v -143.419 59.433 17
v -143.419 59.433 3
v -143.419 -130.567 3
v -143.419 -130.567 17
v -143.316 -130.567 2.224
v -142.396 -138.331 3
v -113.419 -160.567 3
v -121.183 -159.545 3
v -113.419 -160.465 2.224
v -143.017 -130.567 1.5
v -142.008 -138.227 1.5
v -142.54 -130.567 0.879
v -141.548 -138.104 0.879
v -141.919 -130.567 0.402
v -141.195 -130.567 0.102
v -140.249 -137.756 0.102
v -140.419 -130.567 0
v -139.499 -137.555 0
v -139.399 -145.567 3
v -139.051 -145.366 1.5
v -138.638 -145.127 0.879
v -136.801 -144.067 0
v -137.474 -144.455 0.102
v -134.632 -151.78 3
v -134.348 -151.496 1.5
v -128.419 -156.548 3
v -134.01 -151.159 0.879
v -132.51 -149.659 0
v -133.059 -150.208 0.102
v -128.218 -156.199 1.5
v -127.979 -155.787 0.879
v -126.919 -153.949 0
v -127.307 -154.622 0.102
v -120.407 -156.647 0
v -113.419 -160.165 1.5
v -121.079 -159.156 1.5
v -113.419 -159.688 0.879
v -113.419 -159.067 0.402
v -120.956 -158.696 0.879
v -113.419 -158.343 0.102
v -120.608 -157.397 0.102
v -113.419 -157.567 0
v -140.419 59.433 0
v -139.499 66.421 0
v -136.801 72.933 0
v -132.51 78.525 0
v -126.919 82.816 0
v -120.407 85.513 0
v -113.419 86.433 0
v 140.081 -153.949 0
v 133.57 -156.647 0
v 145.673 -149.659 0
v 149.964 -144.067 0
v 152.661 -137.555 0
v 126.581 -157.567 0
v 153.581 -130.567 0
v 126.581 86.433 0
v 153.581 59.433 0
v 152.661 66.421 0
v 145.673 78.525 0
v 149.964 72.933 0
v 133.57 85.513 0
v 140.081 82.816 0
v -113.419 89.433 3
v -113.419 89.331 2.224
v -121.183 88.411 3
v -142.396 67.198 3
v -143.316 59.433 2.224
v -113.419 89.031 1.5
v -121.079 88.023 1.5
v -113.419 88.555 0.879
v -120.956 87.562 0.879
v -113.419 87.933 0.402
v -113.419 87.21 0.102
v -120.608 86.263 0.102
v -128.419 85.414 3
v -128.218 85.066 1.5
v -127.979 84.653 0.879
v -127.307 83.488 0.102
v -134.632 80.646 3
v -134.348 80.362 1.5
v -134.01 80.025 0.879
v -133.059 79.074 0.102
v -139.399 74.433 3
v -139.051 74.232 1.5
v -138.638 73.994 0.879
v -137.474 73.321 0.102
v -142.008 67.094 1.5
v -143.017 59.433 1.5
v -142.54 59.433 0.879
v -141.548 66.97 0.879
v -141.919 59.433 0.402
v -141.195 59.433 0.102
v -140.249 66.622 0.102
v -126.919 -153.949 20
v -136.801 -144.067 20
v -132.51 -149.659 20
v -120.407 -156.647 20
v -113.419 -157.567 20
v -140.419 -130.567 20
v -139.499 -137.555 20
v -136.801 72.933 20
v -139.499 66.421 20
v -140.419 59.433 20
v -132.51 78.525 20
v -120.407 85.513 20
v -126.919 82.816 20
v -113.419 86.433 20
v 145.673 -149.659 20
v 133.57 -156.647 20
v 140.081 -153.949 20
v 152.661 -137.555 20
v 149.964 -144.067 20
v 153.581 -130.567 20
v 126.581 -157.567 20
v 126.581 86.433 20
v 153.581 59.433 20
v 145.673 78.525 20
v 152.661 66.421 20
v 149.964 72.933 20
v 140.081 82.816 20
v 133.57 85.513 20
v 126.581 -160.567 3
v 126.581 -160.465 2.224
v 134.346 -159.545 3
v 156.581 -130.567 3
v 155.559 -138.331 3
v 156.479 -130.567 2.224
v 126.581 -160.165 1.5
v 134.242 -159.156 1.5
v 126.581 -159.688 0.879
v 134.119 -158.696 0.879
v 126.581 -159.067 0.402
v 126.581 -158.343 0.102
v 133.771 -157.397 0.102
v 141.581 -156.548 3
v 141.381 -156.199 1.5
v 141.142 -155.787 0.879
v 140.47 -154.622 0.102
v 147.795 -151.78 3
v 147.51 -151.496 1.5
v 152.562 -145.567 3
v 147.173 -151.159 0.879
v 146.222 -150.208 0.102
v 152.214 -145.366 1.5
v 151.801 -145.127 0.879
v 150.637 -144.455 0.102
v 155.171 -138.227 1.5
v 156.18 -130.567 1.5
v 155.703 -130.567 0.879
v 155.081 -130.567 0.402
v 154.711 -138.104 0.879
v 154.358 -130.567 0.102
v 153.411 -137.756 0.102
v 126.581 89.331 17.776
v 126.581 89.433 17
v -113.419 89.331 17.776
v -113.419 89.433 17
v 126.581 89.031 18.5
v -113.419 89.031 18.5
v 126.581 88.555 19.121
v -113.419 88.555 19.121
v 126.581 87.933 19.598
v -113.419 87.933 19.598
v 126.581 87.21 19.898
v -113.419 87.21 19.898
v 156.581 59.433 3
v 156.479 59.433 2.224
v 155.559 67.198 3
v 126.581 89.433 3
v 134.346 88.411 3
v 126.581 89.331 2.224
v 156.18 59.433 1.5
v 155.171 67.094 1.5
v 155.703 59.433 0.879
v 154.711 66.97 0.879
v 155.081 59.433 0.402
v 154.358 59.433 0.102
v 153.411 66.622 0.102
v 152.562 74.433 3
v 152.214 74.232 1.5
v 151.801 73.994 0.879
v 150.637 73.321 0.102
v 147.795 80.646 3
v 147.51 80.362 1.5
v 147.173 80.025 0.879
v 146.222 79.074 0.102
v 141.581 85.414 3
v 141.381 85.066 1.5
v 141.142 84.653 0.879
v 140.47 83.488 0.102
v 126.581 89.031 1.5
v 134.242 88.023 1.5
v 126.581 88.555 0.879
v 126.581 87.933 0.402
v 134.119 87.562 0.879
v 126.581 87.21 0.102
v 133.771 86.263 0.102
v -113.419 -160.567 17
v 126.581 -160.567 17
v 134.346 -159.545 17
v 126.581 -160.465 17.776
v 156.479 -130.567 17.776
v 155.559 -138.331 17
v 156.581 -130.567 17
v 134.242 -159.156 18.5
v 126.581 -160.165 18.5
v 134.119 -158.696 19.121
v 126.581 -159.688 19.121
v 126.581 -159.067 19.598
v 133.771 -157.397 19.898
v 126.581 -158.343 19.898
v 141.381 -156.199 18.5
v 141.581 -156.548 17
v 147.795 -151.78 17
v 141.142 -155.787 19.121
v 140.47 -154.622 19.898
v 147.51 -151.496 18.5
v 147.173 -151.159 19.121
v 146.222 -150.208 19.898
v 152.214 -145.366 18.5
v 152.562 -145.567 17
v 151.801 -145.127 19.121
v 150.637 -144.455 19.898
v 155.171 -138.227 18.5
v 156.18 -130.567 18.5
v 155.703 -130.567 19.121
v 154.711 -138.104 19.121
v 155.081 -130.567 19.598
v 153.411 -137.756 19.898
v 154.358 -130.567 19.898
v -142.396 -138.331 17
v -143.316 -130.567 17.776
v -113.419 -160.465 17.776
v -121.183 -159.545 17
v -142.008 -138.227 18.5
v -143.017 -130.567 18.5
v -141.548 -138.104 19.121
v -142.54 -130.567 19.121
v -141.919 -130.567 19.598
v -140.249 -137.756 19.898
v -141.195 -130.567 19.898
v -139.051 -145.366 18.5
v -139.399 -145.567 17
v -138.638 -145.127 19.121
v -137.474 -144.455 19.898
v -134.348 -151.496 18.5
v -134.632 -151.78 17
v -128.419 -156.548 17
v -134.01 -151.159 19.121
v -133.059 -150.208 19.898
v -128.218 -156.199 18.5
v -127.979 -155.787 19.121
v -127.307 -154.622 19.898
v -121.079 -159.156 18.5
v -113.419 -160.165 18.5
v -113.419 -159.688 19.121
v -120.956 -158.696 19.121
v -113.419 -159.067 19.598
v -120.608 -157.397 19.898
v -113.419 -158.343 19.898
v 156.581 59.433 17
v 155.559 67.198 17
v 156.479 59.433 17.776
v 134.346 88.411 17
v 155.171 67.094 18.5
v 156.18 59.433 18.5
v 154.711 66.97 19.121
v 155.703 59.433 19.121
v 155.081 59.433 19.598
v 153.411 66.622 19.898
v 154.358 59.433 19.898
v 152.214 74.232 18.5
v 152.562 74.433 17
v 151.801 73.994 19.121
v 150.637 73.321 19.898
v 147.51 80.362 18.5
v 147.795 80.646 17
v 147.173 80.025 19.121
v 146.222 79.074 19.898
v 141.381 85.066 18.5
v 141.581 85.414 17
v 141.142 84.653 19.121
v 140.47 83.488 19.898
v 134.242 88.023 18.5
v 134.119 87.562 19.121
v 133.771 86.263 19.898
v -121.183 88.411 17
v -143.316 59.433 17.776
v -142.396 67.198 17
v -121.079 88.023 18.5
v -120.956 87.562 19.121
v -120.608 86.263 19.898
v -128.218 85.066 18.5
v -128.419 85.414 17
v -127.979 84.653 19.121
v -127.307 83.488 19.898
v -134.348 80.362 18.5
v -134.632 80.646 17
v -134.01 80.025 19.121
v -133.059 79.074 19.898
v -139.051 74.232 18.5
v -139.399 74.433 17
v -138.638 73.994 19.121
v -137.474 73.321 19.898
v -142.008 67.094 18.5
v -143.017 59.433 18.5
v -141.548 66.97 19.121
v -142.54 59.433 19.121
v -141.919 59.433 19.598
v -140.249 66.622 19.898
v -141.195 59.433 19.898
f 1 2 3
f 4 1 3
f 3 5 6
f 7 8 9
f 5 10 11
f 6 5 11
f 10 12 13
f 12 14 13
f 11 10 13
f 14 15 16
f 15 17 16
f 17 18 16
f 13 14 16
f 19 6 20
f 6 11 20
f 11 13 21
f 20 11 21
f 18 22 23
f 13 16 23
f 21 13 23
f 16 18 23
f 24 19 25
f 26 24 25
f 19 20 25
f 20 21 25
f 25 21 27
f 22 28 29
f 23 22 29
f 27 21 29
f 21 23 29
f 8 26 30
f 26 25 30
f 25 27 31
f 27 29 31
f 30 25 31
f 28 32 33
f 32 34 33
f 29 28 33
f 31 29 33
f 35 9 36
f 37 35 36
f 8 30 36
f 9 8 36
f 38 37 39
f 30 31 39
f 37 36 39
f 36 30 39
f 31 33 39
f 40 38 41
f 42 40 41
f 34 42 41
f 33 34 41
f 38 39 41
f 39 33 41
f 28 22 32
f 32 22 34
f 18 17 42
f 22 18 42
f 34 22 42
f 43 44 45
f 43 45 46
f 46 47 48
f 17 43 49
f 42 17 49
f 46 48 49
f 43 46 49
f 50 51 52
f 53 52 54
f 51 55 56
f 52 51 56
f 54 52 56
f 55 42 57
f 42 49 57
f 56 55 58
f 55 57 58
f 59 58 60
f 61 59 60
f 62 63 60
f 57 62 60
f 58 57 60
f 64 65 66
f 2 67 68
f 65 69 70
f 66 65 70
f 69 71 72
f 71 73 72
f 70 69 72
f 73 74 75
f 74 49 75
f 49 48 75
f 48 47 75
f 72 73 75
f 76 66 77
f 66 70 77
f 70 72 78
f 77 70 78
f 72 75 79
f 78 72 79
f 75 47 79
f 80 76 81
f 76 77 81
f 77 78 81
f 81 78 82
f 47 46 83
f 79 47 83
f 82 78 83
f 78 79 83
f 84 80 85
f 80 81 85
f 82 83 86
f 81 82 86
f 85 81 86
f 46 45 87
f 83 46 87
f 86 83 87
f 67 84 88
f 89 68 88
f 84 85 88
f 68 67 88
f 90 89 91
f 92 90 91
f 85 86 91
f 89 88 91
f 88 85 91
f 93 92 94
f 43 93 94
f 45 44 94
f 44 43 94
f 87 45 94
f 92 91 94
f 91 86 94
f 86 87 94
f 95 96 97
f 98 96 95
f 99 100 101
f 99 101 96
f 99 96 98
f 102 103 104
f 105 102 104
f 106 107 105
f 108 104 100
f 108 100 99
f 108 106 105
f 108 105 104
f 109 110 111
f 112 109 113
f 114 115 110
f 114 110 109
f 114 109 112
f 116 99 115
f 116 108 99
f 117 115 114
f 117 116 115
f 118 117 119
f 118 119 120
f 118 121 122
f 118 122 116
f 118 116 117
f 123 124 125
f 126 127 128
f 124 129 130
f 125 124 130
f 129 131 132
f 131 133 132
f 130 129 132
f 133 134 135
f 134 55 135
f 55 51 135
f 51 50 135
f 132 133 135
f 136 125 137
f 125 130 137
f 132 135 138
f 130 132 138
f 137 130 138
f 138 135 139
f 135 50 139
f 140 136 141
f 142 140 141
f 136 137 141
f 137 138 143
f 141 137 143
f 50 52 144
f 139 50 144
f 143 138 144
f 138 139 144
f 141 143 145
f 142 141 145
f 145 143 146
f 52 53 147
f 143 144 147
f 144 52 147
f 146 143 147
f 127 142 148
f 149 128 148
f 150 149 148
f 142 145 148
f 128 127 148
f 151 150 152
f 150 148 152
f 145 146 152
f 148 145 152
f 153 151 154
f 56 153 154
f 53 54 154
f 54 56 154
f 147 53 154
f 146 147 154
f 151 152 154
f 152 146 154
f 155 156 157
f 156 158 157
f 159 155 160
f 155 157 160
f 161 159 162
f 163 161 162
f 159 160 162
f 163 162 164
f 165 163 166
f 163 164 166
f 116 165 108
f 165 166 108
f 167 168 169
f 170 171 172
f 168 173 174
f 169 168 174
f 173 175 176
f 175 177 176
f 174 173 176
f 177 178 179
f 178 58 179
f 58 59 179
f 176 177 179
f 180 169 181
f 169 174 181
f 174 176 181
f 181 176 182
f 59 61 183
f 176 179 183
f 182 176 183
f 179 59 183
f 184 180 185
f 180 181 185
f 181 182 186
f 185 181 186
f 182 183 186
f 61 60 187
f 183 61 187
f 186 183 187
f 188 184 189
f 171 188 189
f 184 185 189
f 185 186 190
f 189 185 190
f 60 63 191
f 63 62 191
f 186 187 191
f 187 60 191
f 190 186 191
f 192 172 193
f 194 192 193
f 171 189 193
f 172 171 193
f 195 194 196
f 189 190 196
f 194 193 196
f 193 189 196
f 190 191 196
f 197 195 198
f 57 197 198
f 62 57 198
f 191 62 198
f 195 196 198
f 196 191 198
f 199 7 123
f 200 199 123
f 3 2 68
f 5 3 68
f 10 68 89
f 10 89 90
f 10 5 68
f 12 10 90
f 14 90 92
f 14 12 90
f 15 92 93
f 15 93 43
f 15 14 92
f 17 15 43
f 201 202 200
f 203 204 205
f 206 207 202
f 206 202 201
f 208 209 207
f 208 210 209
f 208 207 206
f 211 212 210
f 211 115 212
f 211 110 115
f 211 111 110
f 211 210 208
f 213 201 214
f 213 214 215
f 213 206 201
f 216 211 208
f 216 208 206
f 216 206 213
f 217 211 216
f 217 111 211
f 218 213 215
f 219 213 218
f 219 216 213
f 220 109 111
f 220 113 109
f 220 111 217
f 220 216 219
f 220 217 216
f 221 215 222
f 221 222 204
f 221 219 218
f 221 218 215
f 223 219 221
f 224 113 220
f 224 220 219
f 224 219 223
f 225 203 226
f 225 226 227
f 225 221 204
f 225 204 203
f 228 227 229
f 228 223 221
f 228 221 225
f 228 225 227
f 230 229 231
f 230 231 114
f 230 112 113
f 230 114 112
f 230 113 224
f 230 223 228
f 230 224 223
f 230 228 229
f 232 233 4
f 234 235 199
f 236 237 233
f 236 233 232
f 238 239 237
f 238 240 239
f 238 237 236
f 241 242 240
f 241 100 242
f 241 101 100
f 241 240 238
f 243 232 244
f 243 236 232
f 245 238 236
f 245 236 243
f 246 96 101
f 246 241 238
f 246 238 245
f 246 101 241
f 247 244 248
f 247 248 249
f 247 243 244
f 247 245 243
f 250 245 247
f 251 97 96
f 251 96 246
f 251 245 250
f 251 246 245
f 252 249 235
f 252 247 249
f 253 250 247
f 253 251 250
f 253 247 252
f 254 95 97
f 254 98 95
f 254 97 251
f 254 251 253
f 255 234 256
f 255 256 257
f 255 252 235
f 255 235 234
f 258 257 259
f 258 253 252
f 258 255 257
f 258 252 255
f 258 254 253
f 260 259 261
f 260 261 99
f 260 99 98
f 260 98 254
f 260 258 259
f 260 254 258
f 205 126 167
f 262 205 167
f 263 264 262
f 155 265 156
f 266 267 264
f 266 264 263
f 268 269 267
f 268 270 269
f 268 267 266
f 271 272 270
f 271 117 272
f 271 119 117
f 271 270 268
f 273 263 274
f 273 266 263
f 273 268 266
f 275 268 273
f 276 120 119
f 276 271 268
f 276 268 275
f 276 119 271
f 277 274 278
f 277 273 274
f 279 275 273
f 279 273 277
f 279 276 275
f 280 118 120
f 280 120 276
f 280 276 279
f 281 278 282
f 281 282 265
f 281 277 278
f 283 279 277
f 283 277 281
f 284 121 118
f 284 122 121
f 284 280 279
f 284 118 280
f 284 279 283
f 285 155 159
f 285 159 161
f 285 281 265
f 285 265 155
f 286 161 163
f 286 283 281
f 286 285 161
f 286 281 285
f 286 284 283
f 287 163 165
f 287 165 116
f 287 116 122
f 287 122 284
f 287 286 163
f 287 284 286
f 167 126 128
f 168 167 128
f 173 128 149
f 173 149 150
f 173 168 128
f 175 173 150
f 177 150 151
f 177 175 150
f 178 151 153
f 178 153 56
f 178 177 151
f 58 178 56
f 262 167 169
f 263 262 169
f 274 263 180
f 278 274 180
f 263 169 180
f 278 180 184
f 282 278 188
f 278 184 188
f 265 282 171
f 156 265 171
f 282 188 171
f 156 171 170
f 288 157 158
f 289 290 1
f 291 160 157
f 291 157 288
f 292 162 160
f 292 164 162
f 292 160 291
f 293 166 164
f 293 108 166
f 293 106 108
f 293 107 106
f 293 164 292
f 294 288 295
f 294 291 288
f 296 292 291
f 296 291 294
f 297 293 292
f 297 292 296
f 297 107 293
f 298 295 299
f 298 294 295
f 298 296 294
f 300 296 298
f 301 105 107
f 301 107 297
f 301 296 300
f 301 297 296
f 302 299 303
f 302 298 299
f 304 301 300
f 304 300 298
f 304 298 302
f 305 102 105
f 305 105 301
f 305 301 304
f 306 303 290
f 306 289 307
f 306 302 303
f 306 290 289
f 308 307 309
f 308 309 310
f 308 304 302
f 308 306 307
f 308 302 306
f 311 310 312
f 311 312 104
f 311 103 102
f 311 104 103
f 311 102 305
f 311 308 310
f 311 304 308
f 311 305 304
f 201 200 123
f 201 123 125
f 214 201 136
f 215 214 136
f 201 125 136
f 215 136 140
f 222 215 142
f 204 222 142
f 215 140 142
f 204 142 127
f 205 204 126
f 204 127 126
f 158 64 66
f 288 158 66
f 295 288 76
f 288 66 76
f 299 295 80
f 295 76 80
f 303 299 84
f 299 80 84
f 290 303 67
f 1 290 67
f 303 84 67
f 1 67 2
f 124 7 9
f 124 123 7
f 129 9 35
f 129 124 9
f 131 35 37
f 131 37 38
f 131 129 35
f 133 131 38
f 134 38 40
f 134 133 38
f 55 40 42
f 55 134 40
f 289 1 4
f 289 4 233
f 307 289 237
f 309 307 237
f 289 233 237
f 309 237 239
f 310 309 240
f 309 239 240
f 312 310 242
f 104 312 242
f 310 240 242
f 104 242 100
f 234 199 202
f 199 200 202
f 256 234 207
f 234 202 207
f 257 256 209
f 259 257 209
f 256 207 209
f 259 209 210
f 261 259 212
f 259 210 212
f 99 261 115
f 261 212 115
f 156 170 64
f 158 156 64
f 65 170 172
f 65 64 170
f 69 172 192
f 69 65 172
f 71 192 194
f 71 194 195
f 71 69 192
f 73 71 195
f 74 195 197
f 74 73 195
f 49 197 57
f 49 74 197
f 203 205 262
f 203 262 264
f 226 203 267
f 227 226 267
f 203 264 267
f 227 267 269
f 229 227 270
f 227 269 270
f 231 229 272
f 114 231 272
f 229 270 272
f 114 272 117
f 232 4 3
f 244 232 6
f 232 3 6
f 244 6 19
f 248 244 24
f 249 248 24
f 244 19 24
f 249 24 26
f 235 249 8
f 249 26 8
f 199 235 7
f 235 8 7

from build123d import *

# Parameters (mm, degrees)
F1_DEPTH = 20
F2_R     = 3


with BuildPart() as f1:
    # F0 (on Top) → F1 (new body)
    with BuildSketch(Plane.XY):
        with BuildLine():
            Line((126.58147, 89.433213), (-113.41853, 89.433213))
            ThreePointArc((-113.41853, 89.433213), (-134.631733, 80.646416), (-143.41853, 59.433213))
            Line((-143.41853, 59.433213), (-143.41853, -130.566787))
            ThreePointArc((-143.41853, -130.566787), (-134.631733, -151.779991), (-113.41853, -160.566787))
            Line((-113.41853, -160.566787), (126.58147, -160.566787))
            ThreePointArc((126.58147, -160.566787), (147.794674, -151.779991), (156.58147, -130.566787))
            Line((156.58147, -130.566787), (156.58147, 59.433213))
            ThreePointArc((156.58147, 59.433213), (147.794674, 80.646416), (126.58147, 89.433213))
        make_face()
    extrude(amount=F1_DEPTH)

    # F2
    f2_edges = [f1.edges().sort_by_distance(p)[0] for p in [
        (156.58147, -35.566787, 20),
        (147.794674, 80.646416, 20),
        (6.58147, 89.433213, 20),
        (-134.631733, 80.646416, 20),
        (-143.41853, -35.566787, 20),
        (-134.631733, -151.779991, 20),
        (6.58147, -160.566787, 20),
        (147.794674, -151.779991, 20),
        (156.58147, -35.566787, 0),
        (147.794674, 80.646416, 0),
        (6.58147, 89.433213, 0),
        (-134.631733, 80.646416, 0),
        (-143.41853, -35.566787, 0),
        (-134.631733, -151.779991, 0),
        (6.58147, -160.566787, 0),
        (147.794674, -151.779991, 0),
    ]]
    fillet(f2_edges, radius=F2_R)


solid = f1.part
